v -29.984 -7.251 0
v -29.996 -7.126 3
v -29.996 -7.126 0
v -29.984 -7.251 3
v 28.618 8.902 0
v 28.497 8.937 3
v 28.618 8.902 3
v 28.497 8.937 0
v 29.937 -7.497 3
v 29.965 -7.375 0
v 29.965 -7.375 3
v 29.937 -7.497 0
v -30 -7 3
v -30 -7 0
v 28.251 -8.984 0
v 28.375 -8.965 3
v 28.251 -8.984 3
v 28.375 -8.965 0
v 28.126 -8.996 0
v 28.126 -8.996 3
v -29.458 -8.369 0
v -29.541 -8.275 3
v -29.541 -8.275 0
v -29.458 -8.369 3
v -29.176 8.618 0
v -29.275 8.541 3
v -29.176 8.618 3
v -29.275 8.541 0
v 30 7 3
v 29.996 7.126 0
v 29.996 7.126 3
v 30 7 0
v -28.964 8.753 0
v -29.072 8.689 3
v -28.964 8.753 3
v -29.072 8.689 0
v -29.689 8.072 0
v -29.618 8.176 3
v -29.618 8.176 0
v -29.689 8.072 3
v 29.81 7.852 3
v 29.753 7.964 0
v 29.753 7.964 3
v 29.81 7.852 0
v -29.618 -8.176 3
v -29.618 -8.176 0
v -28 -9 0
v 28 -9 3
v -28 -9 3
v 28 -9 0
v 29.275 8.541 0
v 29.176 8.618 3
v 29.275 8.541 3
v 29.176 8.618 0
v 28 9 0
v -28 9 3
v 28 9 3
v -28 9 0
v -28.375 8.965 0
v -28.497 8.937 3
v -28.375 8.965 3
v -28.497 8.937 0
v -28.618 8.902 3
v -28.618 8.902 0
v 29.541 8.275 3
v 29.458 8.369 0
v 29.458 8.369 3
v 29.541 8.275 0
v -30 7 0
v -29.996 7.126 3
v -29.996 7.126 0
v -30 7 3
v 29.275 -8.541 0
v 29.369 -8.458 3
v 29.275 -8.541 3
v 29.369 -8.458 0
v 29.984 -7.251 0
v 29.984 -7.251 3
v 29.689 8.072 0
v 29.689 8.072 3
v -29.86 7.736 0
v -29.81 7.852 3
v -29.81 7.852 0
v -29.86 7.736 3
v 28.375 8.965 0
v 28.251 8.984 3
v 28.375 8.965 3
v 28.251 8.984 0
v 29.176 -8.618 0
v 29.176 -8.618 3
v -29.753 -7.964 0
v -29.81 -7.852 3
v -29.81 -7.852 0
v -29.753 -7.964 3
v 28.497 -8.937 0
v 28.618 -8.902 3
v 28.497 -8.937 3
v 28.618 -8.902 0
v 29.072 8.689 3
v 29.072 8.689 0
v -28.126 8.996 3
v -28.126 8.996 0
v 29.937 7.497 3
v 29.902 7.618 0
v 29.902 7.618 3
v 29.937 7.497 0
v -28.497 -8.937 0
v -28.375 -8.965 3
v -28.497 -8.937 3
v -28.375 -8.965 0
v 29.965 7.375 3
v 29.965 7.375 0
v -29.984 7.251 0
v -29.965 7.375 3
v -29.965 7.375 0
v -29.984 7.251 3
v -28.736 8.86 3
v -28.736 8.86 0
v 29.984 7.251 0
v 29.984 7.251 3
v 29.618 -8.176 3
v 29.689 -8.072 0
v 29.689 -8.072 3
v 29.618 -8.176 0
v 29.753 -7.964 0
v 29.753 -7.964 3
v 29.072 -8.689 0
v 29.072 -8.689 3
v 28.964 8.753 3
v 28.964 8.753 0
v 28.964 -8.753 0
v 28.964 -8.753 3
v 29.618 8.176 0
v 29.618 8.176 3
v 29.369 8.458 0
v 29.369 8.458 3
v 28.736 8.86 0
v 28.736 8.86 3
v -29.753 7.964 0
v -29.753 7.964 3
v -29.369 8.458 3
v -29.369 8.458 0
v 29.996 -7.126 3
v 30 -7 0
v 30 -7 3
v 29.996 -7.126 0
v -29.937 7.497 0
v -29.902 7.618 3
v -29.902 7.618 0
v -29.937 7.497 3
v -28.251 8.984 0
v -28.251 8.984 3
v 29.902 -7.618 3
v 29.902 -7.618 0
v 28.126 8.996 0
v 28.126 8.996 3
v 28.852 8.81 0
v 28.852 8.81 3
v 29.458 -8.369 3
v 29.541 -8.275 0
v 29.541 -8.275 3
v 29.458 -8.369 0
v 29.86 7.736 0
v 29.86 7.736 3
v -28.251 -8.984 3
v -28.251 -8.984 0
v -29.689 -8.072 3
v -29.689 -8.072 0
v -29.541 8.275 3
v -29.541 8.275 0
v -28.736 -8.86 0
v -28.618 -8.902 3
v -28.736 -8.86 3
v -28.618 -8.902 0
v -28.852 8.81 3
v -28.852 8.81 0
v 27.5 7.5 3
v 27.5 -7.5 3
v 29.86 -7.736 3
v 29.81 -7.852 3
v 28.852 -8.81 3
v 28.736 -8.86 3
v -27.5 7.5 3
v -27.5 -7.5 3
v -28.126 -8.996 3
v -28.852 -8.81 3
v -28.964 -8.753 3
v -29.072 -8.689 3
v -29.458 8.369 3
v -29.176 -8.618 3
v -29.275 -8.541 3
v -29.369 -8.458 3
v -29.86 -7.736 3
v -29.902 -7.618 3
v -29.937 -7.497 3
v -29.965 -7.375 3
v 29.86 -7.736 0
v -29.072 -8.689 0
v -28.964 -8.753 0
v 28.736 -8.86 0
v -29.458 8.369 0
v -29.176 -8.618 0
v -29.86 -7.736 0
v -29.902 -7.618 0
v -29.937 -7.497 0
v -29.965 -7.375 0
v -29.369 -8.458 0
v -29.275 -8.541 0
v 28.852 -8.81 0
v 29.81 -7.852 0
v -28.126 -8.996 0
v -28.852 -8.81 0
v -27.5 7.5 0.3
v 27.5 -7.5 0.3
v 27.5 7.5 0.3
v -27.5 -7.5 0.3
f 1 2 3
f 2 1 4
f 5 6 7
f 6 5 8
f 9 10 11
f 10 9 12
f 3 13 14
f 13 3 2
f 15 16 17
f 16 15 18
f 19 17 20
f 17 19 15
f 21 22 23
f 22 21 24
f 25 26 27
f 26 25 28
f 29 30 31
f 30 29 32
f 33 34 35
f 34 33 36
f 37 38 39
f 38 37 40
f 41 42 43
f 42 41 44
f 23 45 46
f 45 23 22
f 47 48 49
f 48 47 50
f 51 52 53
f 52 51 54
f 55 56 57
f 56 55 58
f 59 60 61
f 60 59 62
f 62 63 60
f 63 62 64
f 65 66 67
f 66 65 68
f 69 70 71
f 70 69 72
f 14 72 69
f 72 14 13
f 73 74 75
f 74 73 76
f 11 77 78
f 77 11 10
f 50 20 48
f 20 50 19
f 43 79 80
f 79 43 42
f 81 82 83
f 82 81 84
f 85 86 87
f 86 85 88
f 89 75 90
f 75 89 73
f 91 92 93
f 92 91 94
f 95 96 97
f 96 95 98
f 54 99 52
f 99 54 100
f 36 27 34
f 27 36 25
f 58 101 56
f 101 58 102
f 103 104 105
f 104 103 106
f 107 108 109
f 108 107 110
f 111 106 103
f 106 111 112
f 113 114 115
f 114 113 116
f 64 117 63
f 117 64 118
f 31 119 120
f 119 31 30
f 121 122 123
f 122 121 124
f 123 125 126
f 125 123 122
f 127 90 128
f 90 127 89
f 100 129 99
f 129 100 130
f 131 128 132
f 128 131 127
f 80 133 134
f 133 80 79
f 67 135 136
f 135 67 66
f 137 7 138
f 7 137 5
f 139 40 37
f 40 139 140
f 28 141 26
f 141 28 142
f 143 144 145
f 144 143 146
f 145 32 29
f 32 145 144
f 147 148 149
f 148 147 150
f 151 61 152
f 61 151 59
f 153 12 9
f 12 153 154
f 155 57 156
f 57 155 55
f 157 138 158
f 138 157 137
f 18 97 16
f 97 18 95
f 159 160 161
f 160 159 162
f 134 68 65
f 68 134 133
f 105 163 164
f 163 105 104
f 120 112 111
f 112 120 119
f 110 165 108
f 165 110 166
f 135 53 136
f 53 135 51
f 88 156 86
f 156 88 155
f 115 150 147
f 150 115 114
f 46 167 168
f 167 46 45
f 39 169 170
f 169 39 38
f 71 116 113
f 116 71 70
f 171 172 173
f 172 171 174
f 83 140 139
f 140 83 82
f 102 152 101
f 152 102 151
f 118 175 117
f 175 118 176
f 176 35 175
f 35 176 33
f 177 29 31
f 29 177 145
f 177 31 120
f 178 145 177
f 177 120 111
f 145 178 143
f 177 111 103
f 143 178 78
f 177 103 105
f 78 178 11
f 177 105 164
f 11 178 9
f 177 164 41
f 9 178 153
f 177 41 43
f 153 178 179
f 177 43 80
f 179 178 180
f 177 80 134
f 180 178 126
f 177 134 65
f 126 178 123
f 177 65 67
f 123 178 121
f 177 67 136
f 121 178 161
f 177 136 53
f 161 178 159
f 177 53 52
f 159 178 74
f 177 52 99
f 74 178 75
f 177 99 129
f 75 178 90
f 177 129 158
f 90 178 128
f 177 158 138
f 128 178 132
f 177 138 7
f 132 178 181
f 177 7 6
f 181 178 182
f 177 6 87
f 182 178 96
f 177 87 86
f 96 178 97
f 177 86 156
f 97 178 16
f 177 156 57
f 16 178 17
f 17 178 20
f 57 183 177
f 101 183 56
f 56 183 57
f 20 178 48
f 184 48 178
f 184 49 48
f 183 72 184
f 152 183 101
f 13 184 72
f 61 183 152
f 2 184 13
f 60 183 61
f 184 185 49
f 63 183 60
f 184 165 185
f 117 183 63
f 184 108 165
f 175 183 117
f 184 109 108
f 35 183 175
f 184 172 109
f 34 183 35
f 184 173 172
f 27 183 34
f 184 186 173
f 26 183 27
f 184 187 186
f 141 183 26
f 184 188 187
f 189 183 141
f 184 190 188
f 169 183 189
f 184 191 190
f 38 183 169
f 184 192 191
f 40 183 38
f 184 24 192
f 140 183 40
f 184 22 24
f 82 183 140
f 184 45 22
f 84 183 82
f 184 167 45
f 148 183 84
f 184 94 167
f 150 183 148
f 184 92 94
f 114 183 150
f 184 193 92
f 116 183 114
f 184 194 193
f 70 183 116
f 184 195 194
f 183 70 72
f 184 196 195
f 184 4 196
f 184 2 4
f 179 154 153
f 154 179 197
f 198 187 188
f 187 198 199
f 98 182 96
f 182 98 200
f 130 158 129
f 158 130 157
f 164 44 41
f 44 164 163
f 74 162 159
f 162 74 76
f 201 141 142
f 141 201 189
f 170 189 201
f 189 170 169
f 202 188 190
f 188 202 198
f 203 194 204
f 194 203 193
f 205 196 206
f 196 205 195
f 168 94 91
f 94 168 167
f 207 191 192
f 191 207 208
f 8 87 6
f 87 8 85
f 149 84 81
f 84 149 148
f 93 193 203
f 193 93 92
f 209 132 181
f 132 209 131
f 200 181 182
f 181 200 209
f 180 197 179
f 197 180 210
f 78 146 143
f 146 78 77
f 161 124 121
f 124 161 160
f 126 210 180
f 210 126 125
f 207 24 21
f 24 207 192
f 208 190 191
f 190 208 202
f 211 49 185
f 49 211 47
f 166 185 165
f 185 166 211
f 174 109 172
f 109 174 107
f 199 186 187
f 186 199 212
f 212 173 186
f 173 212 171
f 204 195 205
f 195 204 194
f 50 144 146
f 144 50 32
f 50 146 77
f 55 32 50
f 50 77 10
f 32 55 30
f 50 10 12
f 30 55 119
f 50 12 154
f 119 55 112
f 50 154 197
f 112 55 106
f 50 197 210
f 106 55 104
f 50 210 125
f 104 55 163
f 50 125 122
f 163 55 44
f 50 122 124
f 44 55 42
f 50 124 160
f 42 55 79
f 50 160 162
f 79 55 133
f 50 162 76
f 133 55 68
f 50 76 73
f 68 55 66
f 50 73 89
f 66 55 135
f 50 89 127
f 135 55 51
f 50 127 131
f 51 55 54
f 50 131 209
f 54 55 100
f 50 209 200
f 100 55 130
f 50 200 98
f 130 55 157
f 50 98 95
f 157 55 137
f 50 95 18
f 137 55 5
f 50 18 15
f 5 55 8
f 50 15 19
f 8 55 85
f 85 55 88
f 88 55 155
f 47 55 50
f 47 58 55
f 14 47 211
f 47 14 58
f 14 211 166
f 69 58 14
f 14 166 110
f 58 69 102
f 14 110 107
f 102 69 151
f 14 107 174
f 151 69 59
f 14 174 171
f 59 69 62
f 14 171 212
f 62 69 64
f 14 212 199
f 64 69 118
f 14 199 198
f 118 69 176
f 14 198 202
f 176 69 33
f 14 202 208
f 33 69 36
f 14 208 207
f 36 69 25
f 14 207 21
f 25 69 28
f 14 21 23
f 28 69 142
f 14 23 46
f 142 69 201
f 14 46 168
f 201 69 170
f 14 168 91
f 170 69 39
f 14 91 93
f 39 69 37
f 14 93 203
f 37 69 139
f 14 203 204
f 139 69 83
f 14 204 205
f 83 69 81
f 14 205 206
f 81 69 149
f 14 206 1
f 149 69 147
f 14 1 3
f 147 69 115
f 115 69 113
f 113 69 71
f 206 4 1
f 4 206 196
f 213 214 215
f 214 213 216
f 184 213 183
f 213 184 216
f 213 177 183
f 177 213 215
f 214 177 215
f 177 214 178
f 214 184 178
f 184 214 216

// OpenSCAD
difference() {
    linear_extrude(3) hull(){
        translate([-28,7,0]) circle(2,$fn=100);
        translate([28,7,0]) circle(2,$fn=100);
        translate([-28,-7,0]) circle(2,$fn=100);
        translate([28,-7,0]) circle(2,$fn=100);
    }
    translate([0,0,0.3]) linear_extrude(3) square([55,15],center=true);
}
